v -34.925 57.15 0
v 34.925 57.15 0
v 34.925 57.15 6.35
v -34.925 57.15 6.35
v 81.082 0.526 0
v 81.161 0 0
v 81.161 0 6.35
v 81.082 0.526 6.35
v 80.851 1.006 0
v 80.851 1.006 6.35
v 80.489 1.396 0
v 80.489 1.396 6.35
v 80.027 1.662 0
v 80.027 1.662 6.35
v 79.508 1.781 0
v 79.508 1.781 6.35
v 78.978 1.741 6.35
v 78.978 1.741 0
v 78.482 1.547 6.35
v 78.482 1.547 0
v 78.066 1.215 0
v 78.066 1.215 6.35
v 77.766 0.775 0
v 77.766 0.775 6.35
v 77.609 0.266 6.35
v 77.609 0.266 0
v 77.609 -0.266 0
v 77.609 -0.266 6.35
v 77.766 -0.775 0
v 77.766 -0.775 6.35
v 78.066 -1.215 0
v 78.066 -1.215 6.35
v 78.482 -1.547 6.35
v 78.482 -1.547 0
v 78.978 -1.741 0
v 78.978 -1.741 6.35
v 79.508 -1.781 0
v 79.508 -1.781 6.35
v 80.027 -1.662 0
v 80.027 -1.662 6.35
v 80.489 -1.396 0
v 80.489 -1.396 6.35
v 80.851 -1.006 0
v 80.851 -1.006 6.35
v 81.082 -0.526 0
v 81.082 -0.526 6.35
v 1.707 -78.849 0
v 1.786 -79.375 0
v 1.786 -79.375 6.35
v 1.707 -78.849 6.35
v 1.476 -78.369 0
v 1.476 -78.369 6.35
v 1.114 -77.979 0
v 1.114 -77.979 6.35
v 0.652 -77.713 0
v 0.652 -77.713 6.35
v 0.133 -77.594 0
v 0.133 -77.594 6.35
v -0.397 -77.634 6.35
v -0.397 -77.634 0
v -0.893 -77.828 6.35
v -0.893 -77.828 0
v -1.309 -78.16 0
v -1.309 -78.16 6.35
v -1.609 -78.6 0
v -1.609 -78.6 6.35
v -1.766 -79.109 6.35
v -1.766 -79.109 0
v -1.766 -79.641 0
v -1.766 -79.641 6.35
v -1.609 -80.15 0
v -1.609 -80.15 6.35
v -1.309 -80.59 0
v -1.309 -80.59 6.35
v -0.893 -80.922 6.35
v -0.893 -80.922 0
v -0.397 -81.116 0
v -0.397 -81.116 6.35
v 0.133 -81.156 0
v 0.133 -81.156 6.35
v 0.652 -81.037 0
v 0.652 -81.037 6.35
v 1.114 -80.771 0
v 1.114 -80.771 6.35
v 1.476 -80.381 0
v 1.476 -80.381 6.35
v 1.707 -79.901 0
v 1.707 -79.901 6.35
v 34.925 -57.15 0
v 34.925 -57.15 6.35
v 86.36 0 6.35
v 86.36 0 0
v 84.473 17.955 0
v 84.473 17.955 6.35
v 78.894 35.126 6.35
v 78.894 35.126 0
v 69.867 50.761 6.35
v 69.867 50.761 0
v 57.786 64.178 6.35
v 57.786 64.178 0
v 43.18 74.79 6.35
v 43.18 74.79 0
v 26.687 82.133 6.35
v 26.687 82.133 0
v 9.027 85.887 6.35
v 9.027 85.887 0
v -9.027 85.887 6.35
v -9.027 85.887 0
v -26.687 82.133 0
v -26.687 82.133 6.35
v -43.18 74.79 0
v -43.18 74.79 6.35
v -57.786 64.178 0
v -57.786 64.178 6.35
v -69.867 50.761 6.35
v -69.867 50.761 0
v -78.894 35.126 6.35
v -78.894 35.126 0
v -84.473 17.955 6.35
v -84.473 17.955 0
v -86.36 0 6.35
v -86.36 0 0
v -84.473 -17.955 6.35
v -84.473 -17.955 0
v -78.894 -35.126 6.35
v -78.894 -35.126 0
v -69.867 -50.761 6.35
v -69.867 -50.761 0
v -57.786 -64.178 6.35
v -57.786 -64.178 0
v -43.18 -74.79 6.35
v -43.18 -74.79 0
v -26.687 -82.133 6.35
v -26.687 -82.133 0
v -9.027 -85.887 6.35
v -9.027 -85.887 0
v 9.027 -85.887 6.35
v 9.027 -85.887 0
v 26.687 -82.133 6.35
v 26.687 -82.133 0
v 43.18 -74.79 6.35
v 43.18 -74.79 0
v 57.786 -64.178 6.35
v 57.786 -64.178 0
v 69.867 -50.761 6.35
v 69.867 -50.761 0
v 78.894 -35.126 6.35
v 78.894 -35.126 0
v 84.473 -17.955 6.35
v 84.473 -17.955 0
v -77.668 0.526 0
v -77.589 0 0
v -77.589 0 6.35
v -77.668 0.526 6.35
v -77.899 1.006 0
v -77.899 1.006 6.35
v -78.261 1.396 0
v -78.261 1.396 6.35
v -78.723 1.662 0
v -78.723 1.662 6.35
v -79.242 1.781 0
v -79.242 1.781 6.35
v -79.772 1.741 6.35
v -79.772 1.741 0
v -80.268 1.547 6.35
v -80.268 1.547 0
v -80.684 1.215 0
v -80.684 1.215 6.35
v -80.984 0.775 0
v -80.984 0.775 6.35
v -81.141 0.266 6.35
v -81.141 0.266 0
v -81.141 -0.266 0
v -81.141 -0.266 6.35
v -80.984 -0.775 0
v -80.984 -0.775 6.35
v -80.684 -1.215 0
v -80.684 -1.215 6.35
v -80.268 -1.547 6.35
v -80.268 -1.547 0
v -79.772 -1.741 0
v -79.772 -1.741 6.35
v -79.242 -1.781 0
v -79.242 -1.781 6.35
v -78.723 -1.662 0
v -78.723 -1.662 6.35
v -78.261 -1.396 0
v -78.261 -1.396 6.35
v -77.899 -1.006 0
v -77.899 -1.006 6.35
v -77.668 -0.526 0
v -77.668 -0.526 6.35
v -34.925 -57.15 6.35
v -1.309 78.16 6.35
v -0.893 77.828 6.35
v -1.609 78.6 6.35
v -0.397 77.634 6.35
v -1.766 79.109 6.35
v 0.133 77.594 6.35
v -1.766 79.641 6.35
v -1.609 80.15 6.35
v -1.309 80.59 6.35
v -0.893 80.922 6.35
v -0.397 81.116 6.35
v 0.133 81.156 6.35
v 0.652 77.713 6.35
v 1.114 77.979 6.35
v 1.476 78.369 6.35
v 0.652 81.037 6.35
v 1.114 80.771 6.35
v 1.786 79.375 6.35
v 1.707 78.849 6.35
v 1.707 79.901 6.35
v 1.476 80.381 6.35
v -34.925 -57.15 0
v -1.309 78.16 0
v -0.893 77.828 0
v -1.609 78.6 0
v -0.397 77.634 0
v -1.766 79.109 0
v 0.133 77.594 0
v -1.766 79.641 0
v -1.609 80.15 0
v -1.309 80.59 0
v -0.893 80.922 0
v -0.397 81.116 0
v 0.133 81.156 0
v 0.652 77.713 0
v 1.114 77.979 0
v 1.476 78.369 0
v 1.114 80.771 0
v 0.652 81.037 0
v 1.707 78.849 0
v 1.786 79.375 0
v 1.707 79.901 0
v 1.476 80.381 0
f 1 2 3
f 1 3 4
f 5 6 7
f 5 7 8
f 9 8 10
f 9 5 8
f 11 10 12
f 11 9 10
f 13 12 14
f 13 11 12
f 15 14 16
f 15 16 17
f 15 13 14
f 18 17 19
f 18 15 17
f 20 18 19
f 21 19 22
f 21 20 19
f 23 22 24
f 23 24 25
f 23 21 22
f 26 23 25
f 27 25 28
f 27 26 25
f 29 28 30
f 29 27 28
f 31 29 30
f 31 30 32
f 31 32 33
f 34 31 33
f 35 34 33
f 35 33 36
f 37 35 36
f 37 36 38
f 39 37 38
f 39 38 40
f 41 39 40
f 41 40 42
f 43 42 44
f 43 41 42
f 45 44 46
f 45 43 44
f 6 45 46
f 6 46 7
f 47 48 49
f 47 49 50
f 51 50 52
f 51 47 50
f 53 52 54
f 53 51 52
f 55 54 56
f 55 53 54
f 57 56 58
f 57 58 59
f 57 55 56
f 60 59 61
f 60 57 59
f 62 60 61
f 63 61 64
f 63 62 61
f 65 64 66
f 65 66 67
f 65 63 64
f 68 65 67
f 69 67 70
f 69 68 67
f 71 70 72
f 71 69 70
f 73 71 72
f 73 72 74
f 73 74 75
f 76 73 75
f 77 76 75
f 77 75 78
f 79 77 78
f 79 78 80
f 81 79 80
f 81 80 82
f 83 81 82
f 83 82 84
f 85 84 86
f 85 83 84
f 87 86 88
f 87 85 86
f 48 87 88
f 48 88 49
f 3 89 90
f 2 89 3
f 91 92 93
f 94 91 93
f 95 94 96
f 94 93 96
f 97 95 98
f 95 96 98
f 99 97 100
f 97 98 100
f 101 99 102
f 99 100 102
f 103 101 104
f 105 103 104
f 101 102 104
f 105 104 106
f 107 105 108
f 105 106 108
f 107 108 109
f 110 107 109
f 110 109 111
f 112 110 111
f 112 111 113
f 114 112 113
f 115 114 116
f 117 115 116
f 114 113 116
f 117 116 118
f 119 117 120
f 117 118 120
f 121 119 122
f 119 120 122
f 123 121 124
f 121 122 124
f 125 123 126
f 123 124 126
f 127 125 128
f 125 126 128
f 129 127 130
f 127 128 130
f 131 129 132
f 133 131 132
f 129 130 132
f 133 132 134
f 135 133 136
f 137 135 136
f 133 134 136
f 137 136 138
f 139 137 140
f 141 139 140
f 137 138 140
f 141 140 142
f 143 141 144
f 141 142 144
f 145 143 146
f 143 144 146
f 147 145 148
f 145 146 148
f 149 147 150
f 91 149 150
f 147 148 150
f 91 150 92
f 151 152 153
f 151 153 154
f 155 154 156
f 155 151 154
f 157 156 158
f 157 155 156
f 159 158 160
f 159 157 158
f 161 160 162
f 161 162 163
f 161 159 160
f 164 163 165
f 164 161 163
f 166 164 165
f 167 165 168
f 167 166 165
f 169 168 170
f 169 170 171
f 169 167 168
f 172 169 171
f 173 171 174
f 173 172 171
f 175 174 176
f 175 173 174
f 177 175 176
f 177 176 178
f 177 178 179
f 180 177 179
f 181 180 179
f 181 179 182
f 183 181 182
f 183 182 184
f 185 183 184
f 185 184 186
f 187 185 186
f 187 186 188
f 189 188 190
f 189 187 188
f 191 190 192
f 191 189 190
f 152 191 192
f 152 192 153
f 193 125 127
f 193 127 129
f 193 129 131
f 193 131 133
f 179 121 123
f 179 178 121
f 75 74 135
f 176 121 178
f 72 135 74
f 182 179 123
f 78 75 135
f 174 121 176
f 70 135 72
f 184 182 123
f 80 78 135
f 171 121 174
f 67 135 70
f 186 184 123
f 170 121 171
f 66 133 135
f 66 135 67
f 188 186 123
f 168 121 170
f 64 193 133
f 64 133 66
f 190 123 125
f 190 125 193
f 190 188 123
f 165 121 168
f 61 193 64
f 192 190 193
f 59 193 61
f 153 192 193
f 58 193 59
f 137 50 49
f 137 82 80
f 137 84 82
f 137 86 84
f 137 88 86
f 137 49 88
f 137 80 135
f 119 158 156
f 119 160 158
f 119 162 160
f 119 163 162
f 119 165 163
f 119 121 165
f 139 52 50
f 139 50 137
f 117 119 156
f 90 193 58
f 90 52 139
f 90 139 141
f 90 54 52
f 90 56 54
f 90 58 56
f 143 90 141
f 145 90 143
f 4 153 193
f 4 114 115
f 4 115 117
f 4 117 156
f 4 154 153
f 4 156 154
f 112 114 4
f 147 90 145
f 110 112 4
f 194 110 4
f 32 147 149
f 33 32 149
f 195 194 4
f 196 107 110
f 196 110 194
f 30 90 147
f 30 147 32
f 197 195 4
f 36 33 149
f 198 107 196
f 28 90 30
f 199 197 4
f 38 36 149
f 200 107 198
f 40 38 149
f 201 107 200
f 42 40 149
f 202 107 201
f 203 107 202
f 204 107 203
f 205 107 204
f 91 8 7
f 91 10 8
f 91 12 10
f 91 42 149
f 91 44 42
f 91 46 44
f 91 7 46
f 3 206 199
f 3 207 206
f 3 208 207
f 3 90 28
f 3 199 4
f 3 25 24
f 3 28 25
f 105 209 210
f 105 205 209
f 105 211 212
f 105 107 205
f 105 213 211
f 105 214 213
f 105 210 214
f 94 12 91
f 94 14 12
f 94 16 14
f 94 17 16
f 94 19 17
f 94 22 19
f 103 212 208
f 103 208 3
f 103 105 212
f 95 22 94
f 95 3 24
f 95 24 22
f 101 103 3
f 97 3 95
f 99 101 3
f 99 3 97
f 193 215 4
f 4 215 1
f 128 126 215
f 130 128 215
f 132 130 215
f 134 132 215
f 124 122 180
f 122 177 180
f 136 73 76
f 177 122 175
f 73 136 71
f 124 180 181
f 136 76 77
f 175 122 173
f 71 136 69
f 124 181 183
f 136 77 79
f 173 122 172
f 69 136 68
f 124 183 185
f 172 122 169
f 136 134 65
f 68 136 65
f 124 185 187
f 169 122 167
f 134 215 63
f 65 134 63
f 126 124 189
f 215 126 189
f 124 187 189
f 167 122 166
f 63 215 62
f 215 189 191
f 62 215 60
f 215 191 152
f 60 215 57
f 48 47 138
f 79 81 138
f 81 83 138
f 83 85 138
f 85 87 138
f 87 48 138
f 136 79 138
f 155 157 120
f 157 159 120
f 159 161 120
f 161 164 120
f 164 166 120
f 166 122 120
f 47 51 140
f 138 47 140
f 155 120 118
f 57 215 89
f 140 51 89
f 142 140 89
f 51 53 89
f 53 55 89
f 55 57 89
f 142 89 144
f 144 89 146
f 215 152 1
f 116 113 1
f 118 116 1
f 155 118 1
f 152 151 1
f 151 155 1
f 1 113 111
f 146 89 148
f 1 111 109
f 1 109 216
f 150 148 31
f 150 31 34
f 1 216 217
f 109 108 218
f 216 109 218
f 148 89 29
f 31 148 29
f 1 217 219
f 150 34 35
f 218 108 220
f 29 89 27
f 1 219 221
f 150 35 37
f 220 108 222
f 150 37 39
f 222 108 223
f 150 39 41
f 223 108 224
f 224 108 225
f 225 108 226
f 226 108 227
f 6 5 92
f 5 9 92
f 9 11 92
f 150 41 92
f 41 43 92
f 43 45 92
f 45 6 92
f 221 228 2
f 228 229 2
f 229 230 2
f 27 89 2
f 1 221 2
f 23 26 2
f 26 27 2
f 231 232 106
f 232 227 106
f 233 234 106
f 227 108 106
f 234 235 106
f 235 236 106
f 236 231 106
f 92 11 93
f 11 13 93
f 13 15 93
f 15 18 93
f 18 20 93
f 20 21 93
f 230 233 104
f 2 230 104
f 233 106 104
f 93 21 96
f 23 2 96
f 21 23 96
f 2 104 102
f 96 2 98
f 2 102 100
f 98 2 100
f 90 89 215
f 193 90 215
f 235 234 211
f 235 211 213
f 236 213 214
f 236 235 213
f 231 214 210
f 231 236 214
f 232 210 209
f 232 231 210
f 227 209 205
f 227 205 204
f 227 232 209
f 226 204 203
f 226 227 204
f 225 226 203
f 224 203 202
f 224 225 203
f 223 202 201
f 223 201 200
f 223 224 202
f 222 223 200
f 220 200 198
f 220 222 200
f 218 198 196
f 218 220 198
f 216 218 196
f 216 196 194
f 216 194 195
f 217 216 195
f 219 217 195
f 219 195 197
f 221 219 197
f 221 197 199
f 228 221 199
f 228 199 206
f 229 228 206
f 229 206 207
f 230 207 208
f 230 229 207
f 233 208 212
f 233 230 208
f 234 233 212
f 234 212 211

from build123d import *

# Parameters (mm, degrees)
SKETCH1_R           = 86.36
SKETCH1_R_2         = 1.7859375
BOSS_EXTRUDE1_DEPTH = 6.35
SKETCH2_W           = 69.85
SKETCH2_H           = 114.3
CUT_EXTRUDE1_DEPTH  = 123.296450071


with BuildPart() as part:
    # Sketch1 → Boss-Extrude1 (new body)
    with BuildSketch(Plane.XY):
        Circle(SKETCH1_R)
        with Locations((0, 79.375)):
            Circle(SKETCH1_R_2, mode=Mode.SUBTRACT)
        with Locations((79.375, 0)):
            Circle(SKETCH1_R_2, mode=Mode.SUBTRACT)
        with Locations((0, -79.375)):
            Circle(SKETCH1_R_2, mode=Mode.SUBTRACT)
        with Locations((-79.375, 0)):
            Circle(SKETCH1_R_2, mode=Mode.SUBTRACT)
    extrude(amount=BOSS_EXTRUDE1_DEPTH)

    # Sketch2 → Cut-Extrude1 (cut, through all)
    with BuildSketch(Plane(origin=(0, 0, 0), x_dir=(-1, 0, 0), z_dir=(0, 0, -1))):
        Rectangle(SKETCH2_W, SKETCH2_H)
    extrude(amount=-CUT_EXTRUDE1_DEPTH, mode=Mode.SUBTRACT)


solid = part.part
